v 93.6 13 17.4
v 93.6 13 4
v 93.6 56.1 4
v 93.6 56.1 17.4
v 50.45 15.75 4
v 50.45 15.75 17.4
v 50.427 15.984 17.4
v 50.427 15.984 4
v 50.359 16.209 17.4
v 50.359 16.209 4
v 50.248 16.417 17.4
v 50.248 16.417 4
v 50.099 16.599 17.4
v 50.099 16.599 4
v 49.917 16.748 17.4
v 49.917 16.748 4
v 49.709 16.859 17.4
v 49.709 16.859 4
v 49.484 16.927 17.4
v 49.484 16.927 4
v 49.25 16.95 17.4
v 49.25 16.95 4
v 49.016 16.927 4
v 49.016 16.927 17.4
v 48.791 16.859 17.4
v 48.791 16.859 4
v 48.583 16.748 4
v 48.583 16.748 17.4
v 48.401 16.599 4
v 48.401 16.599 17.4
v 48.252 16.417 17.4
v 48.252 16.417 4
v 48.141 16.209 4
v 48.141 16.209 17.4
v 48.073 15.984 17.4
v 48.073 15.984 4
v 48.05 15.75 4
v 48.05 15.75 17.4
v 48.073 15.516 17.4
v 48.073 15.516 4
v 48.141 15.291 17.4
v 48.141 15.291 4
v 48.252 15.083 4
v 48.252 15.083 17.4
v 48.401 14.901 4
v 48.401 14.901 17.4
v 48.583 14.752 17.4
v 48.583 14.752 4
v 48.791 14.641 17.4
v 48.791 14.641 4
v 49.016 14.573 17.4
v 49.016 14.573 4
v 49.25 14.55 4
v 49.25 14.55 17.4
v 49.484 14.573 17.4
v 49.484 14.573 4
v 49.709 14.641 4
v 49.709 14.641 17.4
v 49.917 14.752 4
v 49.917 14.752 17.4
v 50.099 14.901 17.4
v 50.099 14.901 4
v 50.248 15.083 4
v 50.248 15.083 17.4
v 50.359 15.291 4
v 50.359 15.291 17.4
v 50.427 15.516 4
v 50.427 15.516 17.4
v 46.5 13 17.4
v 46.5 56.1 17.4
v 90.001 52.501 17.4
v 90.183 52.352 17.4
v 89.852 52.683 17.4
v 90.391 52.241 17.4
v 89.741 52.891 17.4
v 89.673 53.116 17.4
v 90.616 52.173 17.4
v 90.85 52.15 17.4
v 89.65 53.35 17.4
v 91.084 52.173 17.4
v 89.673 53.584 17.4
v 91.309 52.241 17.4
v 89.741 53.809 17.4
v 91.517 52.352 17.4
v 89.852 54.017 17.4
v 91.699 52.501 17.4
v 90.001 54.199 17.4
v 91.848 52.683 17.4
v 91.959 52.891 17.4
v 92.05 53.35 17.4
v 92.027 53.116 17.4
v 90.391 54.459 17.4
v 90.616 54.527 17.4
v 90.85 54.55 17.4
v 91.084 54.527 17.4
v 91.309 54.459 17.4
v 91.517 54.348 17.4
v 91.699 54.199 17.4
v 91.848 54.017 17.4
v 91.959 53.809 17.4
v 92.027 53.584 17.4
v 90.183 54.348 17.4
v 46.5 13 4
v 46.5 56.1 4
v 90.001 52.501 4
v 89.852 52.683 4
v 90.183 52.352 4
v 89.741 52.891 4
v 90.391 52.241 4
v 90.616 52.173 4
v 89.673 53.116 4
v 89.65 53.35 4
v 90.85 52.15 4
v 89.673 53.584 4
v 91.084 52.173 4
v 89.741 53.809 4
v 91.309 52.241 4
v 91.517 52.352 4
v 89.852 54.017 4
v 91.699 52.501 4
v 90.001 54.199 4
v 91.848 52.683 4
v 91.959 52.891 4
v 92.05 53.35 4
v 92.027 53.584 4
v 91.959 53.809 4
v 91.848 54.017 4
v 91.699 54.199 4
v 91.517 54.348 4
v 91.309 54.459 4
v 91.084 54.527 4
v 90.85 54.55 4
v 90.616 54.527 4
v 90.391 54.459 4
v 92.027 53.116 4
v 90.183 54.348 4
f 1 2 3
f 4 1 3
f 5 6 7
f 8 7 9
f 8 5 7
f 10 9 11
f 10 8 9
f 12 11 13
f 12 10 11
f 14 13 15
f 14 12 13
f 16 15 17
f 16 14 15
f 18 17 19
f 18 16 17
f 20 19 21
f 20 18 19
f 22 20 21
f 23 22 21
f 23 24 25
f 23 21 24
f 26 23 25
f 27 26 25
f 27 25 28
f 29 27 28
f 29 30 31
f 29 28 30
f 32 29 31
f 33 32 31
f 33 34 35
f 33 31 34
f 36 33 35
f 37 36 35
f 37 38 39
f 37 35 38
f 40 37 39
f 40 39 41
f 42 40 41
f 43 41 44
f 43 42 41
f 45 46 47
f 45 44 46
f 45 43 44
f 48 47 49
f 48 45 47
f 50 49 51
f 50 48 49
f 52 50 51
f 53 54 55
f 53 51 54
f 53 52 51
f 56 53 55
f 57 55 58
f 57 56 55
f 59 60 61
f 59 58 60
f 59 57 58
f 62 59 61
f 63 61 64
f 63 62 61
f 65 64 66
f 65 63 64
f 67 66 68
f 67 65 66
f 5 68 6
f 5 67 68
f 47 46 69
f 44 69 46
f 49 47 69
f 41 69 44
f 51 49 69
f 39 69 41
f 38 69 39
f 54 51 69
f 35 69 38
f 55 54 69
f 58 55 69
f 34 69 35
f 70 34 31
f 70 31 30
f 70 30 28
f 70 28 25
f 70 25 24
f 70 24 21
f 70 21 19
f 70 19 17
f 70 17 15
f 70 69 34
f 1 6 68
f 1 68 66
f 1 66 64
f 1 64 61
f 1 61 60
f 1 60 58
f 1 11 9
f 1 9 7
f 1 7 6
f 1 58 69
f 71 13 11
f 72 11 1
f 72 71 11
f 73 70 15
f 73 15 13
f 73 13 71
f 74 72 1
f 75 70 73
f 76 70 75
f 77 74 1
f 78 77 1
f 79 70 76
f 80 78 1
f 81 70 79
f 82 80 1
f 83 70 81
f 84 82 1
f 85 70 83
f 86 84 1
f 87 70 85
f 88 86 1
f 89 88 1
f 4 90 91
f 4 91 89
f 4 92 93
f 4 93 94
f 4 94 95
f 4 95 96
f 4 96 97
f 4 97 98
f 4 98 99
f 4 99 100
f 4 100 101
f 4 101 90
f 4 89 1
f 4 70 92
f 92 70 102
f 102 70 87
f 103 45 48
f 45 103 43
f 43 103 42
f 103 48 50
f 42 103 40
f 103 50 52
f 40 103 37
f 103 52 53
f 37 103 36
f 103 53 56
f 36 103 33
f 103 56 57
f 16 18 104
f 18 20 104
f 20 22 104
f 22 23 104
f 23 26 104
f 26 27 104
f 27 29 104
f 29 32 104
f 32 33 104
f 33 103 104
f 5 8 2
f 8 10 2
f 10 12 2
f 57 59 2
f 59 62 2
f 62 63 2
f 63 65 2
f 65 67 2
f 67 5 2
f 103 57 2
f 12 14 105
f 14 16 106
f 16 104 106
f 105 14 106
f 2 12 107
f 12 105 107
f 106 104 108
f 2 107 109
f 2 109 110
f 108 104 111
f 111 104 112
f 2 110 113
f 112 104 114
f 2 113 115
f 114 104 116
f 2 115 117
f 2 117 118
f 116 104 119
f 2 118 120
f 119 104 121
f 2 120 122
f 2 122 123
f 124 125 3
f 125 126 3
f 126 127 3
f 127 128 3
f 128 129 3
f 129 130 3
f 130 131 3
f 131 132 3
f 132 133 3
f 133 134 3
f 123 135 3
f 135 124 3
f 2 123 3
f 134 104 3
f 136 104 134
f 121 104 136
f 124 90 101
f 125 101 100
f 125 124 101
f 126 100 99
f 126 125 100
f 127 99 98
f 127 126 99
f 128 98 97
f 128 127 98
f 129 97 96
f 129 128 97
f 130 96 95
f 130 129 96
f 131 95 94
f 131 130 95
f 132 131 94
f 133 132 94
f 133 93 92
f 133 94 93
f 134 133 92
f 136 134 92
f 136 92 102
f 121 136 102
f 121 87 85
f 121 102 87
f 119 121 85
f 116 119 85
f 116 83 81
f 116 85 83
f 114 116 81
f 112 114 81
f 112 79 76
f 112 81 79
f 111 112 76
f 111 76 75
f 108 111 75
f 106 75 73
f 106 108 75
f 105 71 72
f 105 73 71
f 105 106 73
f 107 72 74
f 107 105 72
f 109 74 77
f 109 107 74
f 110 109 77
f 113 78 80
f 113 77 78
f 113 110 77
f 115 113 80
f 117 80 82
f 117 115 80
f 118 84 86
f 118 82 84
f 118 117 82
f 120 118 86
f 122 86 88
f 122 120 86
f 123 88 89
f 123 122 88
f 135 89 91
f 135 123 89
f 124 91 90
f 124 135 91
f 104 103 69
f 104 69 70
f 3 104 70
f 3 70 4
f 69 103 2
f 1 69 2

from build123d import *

# Parameters (mm, degrees)
CYLINDER046_R     = 1.2
CYLINDER046_DEPTH = 20
CYLINDER045_R     = 1.2
CYLINDER045_DEPTH = 20
BOX043_W          = 47.1
BOX043_H          = 43.1
BOX043_DEPTH      = 13.4


with BuildPart() as cylinder046:
    # Cylinder046 → Cylinder046 (new body)
    with BuildSketch(Plane(origin=(44.35, 40.35, 0), x_dir=(1, 0, 0), z_dir=(0, 0, 1))):
        Circle(CYLINDER046_R)
    extrude(amount=CYLINDER046_DEPTH)


with BuildPart() as fusion030:
    # Cylinder045 → Cylinder045 (new body)
    with BuildSketch(Plane(origin=(2.75, 2.75, 0), x_dir=(1, 0, 0), z_dir=(0, 0, 1))):
        Circle(CYLINDER045_R)
    extrude(amount=CYLINDER045_DEPTH)

    # Fusion030: union Cylinder046
    add(cylinder046.part)


with BuildPart() as ips7100s:
    # Box043 → Box043 (new body)
    with BuildSketch(Plane.XY):
        with Locations((23.55, 21.55)):
            Rectangle(BOX043_W, BOX043_H)
    extrude(amount=BOX043_DEPTH)

    # Cut012: cut Fusion030
    add(fusion030.part, mode=Mode.SUBTRACT)


with BuildPart() as ips7100s_1:
    # Cut012 placement: moved
    add(ips7100s.part.moved(Location((46.5, 13, 4))))


solid = ips7100s_1.part
